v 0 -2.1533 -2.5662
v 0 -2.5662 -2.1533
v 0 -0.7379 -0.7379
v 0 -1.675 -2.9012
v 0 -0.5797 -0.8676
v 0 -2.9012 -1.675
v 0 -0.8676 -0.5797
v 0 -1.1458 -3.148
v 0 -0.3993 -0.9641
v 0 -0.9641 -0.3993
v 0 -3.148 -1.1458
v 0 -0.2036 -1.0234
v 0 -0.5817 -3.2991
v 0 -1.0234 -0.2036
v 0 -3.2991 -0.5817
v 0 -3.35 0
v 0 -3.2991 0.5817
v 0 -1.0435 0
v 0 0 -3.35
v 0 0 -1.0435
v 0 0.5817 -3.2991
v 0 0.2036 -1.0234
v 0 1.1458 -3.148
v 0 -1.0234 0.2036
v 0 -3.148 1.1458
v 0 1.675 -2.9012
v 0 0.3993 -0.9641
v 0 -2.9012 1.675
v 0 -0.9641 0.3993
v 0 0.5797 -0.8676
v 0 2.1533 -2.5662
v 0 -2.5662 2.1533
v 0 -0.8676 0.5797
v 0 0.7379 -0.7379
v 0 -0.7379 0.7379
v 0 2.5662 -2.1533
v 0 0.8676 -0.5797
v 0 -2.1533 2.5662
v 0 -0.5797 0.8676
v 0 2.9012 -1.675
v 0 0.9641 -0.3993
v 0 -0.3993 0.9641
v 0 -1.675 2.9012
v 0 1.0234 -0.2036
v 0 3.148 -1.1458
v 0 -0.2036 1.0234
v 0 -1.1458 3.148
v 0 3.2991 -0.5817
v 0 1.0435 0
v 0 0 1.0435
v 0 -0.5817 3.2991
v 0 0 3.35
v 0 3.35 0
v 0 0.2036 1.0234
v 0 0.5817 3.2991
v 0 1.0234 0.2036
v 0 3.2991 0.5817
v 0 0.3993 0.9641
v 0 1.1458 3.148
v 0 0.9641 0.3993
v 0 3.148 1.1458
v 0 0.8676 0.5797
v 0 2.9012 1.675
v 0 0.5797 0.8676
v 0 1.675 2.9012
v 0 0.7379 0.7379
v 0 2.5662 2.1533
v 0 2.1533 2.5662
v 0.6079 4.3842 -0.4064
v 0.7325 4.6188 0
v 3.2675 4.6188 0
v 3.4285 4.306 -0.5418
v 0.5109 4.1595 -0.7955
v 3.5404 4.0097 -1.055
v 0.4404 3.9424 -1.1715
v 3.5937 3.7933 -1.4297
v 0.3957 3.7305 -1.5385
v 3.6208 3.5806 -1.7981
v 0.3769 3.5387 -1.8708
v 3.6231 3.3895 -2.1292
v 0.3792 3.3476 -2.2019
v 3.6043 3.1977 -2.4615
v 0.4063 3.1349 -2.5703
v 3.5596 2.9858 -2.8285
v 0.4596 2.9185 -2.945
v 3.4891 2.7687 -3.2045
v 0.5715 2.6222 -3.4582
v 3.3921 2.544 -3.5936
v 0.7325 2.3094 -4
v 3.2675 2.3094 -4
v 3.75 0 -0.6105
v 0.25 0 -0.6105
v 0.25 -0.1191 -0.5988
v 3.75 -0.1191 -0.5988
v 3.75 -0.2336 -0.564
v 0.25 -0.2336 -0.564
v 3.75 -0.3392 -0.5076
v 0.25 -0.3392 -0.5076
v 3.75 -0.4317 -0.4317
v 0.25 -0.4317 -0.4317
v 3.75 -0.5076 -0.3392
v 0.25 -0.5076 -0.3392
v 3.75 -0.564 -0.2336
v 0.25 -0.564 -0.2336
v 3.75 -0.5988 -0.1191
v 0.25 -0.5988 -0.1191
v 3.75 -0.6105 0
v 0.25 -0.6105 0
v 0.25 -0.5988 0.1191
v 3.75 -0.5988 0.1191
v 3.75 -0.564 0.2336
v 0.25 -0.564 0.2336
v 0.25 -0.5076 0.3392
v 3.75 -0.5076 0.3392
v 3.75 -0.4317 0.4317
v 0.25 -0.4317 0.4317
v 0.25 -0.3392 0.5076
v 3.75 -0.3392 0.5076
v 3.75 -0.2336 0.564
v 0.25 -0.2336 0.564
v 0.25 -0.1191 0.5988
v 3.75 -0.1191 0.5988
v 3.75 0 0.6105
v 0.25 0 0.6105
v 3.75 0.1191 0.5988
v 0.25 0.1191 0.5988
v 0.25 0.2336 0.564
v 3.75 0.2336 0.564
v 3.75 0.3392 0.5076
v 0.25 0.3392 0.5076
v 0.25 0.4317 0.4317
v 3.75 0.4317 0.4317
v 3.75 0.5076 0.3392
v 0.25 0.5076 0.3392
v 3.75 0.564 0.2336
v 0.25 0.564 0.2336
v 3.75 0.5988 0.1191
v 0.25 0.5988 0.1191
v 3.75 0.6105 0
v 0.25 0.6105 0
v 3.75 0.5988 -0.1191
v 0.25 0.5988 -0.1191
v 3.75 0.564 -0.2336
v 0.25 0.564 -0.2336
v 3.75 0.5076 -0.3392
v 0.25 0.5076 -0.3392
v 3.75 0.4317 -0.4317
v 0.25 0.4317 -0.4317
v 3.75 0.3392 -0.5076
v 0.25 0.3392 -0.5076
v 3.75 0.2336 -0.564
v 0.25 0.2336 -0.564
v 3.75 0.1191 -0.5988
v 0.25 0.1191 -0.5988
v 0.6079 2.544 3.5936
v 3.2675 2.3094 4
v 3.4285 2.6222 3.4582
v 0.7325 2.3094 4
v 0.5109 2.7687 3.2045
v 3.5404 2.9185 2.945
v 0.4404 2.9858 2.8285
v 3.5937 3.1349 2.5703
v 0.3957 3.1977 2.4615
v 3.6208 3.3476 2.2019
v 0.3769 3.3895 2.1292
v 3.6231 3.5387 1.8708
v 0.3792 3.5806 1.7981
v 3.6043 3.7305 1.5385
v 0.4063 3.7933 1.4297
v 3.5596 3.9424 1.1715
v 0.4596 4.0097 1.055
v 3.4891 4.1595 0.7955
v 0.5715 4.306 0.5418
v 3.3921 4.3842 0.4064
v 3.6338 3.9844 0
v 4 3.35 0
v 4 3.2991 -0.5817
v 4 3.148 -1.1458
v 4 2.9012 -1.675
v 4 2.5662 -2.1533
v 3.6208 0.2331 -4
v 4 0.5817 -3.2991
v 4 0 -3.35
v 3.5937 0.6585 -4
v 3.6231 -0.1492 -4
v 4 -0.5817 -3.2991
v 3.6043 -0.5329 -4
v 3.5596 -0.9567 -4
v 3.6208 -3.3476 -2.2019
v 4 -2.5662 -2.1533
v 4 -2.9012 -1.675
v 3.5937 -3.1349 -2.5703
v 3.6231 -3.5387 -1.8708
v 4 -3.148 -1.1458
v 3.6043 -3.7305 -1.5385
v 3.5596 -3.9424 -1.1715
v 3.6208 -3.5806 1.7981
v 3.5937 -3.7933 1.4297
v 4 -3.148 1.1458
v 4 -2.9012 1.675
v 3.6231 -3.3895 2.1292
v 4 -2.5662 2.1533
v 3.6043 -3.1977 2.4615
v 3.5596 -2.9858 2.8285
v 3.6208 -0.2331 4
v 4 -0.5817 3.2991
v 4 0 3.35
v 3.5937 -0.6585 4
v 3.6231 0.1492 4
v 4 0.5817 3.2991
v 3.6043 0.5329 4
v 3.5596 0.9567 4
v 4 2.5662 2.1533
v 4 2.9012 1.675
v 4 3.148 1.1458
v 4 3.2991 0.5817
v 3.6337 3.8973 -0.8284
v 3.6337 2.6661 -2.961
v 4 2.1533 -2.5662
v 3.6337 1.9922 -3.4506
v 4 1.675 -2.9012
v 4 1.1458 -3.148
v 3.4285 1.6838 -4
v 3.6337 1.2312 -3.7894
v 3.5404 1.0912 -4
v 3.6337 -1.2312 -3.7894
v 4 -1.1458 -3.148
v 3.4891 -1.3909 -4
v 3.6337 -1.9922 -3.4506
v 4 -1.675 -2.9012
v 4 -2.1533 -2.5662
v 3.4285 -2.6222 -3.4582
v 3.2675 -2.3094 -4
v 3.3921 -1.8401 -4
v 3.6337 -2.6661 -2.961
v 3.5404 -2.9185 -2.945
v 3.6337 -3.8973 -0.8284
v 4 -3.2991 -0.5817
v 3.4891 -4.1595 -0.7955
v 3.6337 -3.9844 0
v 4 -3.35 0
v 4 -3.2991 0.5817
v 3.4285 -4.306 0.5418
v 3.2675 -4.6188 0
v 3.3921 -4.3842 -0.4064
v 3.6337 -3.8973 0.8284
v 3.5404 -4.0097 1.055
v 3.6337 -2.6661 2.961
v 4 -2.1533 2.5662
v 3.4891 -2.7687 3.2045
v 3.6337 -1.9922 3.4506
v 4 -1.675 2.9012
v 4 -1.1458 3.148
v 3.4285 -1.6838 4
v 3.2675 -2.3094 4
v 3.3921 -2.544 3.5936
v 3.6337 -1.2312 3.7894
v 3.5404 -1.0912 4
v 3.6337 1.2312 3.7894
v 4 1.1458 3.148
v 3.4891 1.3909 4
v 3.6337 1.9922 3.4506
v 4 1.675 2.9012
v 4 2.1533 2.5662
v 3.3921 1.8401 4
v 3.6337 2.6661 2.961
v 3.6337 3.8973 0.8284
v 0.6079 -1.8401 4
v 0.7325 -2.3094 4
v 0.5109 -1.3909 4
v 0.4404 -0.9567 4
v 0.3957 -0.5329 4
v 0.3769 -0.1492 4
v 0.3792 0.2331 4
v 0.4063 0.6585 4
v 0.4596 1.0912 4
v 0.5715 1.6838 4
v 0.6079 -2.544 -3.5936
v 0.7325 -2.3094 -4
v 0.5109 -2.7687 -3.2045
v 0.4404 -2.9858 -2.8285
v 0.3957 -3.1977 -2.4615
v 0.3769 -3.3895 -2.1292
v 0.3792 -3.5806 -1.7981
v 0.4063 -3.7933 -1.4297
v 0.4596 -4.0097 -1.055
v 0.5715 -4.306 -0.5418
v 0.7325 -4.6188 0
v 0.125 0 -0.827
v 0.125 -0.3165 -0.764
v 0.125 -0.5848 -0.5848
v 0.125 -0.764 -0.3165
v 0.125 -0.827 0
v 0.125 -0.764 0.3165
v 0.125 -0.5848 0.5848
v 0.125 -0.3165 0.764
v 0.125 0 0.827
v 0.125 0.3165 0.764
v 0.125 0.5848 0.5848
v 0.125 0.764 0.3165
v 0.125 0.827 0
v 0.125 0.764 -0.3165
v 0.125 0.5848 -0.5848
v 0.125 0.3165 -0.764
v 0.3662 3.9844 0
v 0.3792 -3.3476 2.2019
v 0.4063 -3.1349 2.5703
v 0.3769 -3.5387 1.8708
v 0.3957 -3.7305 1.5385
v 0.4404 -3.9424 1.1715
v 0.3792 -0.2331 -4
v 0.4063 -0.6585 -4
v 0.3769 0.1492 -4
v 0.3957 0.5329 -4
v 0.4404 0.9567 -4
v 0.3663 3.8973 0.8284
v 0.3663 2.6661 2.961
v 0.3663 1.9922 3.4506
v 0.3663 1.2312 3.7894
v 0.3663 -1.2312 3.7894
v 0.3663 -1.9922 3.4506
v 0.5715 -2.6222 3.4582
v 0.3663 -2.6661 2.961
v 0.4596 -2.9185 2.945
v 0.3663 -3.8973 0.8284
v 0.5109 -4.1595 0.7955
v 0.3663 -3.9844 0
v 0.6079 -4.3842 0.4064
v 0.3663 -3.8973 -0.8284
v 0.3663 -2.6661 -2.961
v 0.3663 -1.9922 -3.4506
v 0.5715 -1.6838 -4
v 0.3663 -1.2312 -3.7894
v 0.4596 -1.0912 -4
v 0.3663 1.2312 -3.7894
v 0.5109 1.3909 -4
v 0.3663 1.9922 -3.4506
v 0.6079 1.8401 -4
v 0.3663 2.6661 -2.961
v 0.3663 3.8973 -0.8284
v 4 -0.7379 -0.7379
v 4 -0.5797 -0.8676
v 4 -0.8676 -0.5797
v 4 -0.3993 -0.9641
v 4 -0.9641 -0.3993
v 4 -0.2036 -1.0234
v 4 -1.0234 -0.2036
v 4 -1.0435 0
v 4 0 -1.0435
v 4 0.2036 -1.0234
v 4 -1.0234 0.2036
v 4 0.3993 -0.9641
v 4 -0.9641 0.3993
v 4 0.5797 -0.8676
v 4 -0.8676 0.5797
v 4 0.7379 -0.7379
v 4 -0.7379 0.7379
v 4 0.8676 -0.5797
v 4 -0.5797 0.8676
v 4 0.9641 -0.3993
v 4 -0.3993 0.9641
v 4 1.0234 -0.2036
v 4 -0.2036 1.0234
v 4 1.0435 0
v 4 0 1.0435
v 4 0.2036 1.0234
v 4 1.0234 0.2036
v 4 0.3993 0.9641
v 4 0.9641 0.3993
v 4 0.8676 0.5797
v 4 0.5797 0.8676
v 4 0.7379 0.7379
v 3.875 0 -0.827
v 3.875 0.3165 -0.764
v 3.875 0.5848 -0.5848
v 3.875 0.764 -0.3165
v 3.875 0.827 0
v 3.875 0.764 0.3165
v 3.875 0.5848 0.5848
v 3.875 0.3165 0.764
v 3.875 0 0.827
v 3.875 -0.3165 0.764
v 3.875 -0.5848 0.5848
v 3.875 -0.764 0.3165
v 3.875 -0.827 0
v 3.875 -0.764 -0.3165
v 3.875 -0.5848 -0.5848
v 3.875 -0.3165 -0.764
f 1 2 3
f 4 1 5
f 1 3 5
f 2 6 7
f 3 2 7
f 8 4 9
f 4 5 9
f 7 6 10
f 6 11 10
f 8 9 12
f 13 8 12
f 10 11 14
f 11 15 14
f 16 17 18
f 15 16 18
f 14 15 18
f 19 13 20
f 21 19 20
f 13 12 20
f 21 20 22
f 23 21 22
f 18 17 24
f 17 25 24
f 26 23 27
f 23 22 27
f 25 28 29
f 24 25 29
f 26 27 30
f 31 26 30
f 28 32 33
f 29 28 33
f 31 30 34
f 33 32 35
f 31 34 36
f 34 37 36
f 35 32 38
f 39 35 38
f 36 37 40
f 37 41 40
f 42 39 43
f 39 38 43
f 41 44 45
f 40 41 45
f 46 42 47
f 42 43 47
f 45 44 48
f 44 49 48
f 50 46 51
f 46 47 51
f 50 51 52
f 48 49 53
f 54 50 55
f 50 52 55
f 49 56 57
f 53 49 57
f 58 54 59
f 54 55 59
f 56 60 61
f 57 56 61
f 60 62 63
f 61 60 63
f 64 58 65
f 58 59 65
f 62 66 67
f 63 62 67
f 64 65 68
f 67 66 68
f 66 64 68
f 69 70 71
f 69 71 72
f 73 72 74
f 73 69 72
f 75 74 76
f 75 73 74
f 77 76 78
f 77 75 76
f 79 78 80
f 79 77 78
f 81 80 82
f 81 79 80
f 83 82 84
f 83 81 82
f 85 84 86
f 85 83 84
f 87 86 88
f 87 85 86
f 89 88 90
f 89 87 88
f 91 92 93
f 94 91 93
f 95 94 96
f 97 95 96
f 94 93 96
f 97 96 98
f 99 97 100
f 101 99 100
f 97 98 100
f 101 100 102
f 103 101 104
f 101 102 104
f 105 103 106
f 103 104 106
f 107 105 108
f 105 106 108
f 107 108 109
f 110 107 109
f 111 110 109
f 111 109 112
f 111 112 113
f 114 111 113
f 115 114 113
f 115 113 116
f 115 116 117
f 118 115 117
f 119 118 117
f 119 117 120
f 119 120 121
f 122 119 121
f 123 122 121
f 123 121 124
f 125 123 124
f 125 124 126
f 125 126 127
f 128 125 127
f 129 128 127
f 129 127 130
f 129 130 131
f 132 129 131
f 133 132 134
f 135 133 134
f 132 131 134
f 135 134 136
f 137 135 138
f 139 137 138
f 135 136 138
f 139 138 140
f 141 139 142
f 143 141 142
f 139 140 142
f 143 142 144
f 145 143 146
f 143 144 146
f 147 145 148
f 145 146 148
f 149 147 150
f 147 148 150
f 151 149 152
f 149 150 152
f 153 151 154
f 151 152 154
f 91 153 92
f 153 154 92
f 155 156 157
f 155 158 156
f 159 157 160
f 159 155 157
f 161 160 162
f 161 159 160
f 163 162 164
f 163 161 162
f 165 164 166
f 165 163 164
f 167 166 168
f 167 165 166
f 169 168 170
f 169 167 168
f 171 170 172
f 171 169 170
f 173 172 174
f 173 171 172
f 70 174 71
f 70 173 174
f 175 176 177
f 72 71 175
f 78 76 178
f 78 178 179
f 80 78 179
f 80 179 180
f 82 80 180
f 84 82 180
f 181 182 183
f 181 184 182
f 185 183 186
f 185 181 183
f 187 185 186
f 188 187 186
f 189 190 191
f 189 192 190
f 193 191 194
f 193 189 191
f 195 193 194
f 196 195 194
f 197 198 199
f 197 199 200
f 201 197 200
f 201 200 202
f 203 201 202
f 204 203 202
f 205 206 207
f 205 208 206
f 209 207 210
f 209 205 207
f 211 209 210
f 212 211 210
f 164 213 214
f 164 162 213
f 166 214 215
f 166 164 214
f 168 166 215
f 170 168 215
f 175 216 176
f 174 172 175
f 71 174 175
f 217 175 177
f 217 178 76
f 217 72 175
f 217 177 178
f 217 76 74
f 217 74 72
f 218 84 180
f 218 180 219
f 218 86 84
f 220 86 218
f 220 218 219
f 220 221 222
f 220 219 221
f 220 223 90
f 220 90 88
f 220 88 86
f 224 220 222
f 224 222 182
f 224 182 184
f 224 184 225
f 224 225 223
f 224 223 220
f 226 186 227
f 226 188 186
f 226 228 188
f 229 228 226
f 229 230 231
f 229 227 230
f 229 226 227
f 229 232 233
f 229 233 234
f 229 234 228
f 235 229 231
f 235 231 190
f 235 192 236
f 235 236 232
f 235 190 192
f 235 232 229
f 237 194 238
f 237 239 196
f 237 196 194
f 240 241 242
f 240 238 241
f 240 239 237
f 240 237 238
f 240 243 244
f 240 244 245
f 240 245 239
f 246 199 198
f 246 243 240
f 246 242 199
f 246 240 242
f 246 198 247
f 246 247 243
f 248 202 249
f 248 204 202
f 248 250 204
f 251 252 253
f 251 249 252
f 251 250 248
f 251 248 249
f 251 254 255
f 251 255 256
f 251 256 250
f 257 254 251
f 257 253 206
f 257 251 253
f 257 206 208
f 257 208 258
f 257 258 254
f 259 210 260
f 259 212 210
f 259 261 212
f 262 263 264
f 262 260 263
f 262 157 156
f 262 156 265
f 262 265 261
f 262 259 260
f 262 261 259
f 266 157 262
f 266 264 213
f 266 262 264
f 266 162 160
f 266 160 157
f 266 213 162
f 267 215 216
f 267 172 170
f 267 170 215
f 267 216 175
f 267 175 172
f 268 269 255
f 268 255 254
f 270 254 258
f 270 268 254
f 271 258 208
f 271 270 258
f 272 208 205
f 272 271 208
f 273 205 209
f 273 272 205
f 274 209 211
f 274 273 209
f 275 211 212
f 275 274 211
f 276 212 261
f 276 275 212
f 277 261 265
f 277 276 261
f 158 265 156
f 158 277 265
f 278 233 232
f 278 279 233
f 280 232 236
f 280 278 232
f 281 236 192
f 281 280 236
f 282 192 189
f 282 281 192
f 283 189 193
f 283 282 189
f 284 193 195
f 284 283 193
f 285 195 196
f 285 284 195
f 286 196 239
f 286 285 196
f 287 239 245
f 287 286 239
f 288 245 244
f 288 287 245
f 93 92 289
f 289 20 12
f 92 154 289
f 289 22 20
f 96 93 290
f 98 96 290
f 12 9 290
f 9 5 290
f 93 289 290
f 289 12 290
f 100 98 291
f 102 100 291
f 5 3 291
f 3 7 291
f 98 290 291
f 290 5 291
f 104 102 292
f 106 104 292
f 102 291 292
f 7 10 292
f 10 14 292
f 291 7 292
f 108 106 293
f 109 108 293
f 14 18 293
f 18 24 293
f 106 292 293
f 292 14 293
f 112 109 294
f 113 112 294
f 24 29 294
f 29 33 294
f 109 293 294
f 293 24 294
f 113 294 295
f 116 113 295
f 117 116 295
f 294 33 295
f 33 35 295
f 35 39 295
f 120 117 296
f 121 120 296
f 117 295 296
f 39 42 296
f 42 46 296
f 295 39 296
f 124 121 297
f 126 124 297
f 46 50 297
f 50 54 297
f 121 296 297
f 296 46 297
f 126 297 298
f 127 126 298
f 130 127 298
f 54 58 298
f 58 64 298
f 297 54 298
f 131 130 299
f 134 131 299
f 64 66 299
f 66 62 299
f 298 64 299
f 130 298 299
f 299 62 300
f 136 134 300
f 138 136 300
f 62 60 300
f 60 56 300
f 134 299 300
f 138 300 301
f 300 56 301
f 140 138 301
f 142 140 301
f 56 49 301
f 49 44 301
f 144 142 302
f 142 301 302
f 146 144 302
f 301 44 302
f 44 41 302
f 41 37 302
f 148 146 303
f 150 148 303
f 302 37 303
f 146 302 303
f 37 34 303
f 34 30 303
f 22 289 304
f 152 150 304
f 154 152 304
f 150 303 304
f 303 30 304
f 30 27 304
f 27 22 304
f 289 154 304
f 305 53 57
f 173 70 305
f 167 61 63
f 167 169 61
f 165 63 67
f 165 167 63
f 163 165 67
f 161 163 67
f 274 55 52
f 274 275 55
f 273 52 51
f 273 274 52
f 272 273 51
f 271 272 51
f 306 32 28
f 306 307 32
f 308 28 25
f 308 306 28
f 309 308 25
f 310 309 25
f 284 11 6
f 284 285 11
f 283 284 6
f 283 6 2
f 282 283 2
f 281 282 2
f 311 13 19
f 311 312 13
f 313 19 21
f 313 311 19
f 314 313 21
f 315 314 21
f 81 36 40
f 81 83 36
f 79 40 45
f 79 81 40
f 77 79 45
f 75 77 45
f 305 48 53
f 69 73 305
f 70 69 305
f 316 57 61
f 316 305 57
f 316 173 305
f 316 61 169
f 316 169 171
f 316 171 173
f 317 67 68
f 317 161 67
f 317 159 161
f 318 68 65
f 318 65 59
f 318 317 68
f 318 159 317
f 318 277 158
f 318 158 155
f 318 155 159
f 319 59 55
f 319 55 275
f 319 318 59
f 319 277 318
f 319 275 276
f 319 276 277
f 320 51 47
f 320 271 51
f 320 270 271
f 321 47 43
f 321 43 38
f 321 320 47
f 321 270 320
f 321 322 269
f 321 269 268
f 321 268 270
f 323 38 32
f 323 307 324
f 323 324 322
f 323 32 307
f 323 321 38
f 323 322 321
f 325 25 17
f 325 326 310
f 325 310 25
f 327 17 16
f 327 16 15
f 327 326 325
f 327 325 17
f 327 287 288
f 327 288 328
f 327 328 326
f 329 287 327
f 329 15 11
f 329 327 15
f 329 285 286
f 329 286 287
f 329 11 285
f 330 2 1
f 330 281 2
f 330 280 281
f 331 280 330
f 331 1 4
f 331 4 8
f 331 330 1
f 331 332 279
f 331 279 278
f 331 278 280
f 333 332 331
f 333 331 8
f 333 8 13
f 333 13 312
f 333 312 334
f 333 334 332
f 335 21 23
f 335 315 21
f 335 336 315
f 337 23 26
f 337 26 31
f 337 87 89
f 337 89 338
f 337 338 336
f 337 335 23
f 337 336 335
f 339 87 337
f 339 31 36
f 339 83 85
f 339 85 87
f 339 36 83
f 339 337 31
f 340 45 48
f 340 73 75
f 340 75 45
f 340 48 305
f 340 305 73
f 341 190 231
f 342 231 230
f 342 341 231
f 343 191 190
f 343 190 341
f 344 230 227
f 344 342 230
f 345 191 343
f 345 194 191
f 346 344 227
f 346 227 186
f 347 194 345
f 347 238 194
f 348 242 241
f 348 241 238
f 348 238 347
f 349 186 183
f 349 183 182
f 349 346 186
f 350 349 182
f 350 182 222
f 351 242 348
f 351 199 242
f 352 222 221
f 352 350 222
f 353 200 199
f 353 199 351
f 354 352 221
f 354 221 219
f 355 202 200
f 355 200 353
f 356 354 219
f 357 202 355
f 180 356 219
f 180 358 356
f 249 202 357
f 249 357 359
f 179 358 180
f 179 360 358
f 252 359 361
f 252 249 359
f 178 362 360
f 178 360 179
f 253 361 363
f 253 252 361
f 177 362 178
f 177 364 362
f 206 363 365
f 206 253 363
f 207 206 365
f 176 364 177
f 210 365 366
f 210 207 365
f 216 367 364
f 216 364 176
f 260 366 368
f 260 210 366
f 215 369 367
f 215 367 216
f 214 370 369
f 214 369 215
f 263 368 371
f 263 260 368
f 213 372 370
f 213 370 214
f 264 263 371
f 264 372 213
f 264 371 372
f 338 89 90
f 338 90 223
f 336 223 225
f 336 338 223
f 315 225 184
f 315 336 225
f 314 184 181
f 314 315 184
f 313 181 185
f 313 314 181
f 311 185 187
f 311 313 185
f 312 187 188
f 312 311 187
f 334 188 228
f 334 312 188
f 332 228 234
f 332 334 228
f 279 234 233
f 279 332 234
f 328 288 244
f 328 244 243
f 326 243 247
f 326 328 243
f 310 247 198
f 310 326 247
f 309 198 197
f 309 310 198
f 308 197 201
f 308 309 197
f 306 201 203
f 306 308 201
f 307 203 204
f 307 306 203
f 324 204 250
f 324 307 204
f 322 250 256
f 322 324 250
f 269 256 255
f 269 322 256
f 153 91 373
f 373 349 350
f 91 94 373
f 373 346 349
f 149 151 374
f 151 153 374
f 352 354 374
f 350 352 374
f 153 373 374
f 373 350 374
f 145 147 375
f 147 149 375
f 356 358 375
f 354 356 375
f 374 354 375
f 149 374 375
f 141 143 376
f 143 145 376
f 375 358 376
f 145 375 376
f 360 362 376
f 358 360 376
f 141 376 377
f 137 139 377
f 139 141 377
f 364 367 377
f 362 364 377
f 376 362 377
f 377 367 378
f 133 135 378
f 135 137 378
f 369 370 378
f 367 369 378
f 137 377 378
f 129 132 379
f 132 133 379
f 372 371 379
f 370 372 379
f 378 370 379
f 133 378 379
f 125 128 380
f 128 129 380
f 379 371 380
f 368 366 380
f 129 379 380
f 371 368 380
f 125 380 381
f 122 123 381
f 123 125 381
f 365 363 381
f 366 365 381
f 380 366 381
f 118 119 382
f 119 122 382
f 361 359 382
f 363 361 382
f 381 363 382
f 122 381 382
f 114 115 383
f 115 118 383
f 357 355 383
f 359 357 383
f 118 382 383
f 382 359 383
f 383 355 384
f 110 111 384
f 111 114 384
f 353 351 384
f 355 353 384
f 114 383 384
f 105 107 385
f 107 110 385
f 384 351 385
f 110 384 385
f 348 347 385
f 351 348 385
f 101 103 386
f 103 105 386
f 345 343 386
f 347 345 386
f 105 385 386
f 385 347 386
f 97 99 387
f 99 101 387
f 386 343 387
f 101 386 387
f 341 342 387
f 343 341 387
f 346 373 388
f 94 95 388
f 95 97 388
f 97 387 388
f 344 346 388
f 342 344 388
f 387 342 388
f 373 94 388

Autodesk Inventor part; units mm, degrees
ref_plane "YZ Plane" through (0, 0, 0) normal (1, 0, 0) x (0, 1, 0)
ref_plane "XZ Plane" through (0, 0, 0) normal (0, 1, 0) x (-1, 0, 0)
sketch "Sketch1" plane through (0, 0, 0) normal (1, 0, 0) x (0, 1, 0)
  line L0 (-4.6188, 0) -> (-2.3094, 4)
  line L1 (-2.3094, 4) -> (2.3094, 4)
  line L2 (2.3094, 4) -> (4.6188, 0)
  line L3 (4.6188, 0) -> (2.3094, -4)
  line L4 (2.3094, -4) -> (-2.3094, -4)
  line L5 (-2.3094, -4) -> (-4.6188, 0)
  point P0 (0, 0)
  point P1 (0, 0)
  dimension "d0" = 9.2376
extrude "Body" add sketch "Sketch1" along normal blind 4
sketch "Sketch2" plane through (0, 0, 0) normal (0, 0, 1) x (1, 0, 0)
  line L0 (0, 2.3094) -> (0, 4.6188) projected
  line L1 (0, 4.6188) -> (4, 4.6188) projected
  line L2 (4, 2.3094) -> (4, 4.6188) projected
  line L3 (-0.16, 0) -> (0.96, 0) projected
  line L4 (0.7325, 4.6188) -> (0, 3.35)
  line L5 (3.2675, 4.6188) -> (4, 3.35)
  dimension "d3" = 30
  dimension "d4" = 30
  dimension "d5" = 6.7
  dimension "d6" = 6.7
revolve "Chamfer1" cut sketch "Sketch2" angle 360 about axis through (-10, 0, 0) along (1, 0, 0)
sketch "Sketch3" plane through (4, 0, 0) normal (1, 0, 0) x (0, 0, -1)
  arc A0 (-0.625, -1.0825) -> (0.625, -1.0825) centre (0, 0) ccw projected
hole "Thread" at (4, 0, 0) direction (-1, 0, 0) diameter 1.221 end through all thread size "M1.6x0.35" class "6H" standard "ANSI Metric M Profile"
chamfer "Chamfer2" distance 0.433 angle 30 1 edges at (4, 0, 0.6105) measured on face at (4, 2.4029, -0.2918)
chamfer "Chamfer3" distance 0.433 angle 30 1 edges at (0, 0, 0.6105) measured on face at (0, 2.4029, -0.2918)
ref_plane "Work Plane1" through (-8.8582, 0, 0) normal (0, -0.866, -0.5) x (1, 0, 0)
equation "\"d0\" = 1.1547 * SW"
equation "\"d1\" = KOH"
equation "\"d3\" = ANG1"
equation "\"d4\" = ANG2"
equation "\"d5\" = SW0"
equation "\"d6\" = SW01"
equation "\"d8\" = -0.5 * GD1 + 0.5 * NND"
equation "\"d40\" = -0.5 * GD1 + 0.5 * NND"
equation "\"d10\" = -0.5 * GD1 + 0.5 * NND"
equation "\"d41\" = -0.5 * GD1 + 0.5 * NND"
equation "\"ANG1\" = 30deg"
equation "\"ANG2\" = 30deg"
equation "\"NND\" = 5"
equation "\"KOH\" = 4"
equation "\"SW\" = 8"
equation "\"SW0\" = 6.7"
equation "\"SW01\" = 6.7"
equation "\"GUL\" = 0.541266 * PTC"
equation "\"THREADDIA\" = 5"
equation "\"TOA\" = 30deg"
equation "\"PTC\" = 0.8"
equation "\"E0\" = 1.155 * SW"
equation "\"GAL\" = 0.541266 * PTC"
equation "\"GD1\" = 4.133975"
properties part number "DIN 555-5 - M5" material "Steel, Mild"
